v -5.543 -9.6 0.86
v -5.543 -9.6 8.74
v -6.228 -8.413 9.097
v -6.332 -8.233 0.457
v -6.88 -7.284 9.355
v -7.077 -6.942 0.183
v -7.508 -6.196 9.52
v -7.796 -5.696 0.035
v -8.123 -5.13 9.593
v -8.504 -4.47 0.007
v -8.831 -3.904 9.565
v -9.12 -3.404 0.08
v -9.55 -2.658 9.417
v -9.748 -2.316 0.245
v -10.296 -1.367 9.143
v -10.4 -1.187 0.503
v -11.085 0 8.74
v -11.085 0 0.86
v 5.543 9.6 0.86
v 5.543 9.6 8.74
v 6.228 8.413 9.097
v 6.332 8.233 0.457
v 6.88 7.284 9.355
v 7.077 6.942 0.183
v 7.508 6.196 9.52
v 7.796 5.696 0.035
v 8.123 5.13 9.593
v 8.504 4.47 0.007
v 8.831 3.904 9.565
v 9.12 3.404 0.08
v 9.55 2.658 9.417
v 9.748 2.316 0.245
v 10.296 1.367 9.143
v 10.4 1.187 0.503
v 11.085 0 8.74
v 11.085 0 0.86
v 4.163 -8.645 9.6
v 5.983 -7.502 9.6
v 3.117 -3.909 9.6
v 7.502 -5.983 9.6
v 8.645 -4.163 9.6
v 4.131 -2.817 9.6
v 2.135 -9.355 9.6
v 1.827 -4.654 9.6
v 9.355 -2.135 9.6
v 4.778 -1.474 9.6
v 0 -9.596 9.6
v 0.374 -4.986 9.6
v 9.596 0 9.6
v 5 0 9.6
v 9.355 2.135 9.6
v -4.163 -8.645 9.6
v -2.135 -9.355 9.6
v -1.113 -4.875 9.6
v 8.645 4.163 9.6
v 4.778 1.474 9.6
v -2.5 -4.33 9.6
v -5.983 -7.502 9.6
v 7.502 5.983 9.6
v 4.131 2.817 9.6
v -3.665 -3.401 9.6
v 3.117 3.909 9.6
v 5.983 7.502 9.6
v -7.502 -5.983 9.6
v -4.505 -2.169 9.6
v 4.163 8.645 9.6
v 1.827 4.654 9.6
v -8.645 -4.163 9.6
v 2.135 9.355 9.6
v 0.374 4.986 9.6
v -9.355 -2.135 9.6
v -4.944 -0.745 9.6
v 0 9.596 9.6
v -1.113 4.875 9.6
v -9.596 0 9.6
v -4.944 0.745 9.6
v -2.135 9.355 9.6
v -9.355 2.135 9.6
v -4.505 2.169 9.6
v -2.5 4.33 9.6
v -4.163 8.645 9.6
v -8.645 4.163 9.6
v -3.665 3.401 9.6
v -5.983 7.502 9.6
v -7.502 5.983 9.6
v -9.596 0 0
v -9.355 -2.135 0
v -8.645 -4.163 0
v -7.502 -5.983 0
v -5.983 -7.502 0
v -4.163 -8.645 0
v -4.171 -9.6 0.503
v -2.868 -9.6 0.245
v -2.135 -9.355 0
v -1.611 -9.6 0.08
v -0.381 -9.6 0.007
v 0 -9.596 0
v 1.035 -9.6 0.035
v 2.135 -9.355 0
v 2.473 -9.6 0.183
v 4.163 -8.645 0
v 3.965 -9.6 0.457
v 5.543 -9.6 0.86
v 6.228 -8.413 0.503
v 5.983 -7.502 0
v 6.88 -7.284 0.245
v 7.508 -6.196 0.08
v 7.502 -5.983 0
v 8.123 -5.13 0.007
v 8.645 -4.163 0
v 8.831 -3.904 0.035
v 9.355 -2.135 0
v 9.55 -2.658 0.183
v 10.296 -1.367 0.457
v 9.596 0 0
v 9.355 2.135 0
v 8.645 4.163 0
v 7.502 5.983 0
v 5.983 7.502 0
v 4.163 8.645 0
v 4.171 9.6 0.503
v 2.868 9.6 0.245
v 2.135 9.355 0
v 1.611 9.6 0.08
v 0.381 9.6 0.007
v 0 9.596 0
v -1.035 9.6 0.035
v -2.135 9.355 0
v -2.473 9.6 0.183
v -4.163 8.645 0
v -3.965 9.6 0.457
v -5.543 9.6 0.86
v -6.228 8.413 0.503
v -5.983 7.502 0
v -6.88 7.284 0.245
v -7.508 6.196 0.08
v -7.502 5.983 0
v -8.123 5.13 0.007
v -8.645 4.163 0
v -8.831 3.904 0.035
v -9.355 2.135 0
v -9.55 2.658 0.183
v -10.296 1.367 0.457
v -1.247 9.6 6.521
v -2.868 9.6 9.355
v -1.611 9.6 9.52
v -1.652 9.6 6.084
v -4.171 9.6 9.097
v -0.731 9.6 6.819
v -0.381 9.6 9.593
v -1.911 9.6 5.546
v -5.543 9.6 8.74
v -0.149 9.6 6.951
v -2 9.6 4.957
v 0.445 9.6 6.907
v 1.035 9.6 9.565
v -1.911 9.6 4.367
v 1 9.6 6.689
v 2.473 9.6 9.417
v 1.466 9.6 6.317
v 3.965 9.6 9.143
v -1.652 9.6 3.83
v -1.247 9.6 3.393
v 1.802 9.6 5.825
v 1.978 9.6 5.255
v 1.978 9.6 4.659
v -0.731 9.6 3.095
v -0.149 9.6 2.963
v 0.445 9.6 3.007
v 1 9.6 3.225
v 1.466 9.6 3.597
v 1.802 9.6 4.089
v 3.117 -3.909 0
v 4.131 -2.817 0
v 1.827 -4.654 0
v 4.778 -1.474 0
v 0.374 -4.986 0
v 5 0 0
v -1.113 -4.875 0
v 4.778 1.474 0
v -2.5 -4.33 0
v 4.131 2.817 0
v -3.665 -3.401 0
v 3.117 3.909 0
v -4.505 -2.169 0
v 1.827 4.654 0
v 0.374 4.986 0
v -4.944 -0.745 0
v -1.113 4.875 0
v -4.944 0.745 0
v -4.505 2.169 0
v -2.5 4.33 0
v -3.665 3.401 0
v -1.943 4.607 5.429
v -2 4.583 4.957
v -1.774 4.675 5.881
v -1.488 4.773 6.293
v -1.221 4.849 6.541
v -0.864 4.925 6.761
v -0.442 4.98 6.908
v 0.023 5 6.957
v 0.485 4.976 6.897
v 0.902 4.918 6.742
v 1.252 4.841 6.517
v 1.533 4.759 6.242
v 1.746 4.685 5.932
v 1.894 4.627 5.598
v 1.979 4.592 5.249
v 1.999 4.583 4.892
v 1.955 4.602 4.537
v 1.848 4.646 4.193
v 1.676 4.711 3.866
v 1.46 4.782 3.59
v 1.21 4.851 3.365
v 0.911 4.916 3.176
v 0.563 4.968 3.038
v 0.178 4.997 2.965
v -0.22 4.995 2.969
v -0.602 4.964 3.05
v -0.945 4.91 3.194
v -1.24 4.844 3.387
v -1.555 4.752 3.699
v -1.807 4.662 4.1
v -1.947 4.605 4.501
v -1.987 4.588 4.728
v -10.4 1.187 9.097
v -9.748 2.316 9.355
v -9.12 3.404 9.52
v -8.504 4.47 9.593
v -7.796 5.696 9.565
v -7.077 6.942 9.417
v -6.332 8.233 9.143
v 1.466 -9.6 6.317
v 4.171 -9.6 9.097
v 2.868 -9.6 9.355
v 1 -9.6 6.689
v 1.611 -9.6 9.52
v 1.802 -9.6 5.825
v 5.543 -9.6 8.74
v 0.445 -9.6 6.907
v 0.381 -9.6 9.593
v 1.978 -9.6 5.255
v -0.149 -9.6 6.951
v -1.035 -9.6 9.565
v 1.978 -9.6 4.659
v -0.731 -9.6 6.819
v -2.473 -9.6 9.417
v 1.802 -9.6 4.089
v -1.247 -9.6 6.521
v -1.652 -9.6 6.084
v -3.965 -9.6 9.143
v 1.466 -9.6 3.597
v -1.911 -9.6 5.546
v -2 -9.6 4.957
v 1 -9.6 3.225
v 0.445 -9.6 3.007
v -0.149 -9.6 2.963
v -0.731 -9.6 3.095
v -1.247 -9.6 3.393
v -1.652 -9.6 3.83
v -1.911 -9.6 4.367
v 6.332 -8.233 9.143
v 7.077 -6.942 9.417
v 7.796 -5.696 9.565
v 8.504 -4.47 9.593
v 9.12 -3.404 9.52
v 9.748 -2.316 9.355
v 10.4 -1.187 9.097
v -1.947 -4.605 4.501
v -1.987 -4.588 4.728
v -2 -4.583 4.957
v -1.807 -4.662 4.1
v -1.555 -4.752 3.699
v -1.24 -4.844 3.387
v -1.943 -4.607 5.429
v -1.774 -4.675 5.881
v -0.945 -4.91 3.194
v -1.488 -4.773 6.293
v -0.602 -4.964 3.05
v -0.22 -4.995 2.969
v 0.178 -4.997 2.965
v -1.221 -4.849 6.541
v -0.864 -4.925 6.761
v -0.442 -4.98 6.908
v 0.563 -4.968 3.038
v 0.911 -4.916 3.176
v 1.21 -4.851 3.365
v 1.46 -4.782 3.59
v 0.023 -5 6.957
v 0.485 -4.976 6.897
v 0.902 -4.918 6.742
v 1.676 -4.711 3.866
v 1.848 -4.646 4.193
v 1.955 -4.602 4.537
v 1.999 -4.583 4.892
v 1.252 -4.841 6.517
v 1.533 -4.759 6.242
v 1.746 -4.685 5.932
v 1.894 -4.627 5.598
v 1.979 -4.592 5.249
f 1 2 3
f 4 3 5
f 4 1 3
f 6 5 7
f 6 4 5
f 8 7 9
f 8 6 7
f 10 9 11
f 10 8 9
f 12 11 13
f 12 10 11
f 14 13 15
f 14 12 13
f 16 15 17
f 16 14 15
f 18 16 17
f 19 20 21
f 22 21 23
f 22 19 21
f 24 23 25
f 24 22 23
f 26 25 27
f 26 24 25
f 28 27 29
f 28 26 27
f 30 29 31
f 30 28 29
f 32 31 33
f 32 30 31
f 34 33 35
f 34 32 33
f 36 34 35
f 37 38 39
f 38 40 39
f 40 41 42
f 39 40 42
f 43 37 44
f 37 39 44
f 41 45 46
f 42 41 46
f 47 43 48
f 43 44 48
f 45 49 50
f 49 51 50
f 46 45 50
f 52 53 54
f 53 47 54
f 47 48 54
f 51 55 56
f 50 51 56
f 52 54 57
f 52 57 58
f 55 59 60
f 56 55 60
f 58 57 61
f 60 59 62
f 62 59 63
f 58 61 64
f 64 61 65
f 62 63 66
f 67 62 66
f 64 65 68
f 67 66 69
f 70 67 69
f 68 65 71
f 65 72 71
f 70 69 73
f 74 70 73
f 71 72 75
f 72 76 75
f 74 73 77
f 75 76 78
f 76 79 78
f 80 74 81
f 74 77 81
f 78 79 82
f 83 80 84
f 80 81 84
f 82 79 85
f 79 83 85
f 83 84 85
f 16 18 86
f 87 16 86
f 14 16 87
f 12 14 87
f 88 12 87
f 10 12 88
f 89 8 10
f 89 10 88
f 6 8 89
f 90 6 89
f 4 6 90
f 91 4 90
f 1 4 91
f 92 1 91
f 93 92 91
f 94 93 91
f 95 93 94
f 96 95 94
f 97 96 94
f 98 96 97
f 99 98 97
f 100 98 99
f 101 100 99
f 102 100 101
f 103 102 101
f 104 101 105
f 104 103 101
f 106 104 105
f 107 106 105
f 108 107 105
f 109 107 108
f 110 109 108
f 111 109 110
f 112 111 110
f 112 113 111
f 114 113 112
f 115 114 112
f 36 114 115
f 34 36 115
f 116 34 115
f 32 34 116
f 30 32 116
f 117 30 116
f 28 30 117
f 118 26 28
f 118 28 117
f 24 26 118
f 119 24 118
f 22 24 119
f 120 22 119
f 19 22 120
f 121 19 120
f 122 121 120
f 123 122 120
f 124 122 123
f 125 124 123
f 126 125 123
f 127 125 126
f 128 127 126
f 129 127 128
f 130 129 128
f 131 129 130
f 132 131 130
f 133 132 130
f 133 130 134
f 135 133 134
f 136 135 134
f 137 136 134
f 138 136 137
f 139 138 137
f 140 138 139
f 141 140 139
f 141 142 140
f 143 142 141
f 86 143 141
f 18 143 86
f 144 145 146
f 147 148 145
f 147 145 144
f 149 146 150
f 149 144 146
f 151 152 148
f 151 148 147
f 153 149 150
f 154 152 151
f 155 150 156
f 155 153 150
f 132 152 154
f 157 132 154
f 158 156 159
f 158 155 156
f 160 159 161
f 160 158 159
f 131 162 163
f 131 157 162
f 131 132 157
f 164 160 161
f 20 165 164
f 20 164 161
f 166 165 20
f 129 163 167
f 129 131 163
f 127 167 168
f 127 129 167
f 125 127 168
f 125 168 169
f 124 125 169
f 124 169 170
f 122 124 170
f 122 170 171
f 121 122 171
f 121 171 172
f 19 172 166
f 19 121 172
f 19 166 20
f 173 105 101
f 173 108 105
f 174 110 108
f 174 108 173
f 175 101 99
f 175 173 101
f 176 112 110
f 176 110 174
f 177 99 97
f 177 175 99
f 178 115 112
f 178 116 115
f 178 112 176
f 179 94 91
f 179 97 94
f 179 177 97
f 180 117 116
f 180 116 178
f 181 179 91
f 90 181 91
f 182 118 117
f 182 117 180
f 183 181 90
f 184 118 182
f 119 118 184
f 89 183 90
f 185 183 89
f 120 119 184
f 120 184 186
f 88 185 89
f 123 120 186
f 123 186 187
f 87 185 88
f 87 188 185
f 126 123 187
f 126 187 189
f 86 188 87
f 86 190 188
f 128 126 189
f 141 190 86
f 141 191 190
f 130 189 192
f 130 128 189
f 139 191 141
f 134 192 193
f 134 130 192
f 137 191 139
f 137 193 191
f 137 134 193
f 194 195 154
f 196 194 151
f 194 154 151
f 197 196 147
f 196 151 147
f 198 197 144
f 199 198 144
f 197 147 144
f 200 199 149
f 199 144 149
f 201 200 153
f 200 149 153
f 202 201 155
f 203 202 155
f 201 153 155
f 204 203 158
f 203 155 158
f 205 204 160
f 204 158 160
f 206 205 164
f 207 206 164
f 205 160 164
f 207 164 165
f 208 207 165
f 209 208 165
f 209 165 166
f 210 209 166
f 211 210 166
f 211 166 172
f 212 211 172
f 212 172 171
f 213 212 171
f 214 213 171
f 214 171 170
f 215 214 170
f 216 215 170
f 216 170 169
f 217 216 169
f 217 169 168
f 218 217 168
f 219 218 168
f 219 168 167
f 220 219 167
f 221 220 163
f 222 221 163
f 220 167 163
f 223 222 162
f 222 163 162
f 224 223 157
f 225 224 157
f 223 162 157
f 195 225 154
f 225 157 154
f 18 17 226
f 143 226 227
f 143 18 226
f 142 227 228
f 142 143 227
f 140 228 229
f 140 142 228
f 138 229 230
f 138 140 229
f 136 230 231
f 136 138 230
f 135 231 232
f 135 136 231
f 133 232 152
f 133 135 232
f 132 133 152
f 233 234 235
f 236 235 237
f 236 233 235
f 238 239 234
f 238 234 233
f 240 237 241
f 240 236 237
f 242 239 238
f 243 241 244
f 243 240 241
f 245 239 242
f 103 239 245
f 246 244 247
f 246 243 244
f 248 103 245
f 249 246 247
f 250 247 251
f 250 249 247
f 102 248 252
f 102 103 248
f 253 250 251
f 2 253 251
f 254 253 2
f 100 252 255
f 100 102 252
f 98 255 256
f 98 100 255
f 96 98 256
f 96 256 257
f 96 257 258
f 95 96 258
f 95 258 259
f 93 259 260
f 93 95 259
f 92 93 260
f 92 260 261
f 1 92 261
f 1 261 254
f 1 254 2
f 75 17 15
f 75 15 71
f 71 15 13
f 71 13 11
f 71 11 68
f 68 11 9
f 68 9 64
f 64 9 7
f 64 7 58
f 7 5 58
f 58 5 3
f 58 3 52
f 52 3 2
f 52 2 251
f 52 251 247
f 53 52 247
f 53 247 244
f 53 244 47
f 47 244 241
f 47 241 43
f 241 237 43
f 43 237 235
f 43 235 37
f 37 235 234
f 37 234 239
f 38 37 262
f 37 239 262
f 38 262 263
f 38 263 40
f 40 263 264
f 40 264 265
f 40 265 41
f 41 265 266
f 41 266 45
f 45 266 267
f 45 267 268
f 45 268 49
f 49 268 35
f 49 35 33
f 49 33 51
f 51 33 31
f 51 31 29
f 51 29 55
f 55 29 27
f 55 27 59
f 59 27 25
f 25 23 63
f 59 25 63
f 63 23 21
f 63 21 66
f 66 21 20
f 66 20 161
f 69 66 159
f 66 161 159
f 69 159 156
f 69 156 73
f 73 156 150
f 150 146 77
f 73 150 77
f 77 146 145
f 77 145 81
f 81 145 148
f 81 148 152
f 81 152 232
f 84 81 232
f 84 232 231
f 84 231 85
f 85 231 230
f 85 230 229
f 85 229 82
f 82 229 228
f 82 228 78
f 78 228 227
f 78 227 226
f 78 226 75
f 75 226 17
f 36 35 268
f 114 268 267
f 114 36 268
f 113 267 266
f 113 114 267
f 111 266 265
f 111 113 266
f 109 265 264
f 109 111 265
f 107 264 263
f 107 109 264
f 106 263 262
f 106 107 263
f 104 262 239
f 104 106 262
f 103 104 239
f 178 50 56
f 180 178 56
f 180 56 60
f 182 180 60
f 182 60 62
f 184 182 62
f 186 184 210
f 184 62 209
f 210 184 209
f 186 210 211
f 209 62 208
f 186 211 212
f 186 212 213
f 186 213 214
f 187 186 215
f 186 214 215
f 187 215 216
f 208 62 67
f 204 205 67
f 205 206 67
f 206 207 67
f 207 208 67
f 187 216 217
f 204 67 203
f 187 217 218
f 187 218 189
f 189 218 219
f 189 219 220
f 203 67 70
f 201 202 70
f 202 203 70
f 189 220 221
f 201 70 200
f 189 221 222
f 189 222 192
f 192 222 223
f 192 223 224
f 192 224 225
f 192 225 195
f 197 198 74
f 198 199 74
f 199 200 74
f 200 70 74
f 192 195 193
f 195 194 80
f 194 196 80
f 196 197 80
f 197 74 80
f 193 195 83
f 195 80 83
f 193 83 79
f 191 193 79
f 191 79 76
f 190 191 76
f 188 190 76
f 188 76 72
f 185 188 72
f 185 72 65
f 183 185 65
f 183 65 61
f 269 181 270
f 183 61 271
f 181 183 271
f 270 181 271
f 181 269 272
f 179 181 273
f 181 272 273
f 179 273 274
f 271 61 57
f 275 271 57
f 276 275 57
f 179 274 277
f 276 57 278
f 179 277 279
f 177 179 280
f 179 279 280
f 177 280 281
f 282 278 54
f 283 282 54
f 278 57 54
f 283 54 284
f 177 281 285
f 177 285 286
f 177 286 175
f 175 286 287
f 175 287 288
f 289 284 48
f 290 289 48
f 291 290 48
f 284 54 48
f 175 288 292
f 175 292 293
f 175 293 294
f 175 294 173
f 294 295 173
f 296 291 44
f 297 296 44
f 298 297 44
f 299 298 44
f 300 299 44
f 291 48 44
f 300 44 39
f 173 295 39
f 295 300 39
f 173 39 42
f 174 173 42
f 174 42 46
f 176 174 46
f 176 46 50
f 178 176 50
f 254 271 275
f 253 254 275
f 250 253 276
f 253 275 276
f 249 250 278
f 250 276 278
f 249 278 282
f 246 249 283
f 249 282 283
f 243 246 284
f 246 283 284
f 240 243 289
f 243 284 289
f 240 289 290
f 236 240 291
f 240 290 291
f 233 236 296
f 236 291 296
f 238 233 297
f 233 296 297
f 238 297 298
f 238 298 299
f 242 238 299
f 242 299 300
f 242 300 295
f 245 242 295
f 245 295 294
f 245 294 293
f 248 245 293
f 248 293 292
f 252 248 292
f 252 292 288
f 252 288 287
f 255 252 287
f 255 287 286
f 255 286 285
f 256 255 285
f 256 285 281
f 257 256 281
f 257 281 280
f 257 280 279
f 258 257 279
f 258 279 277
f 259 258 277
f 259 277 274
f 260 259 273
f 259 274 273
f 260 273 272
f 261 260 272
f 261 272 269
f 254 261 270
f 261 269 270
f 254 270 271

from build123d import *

# Parameters (mm, degrees)
BASE_EXTRUSION_DEPTH    = 9.6
ESQUISSE2_R             = 5
ENL_V_MAT_EXTRU_1_DEPTH = 10.6
ESQUISSE4_R             = 2
ENL_V_MAT_EXTRU_2_DEPTH = 20.2


with BuildPart() as part:
    # Esquisse1 → Base-Extrusion (new body)
    with BuildSketch(Plane.XY):
        Polygon((-11.085125168, 0), (-5.542562584, 9.6), (5.542562584, 9.6), (11.085125168, 0), (5.542562584, -9.6), (-5.542562584, -9.6), align=None)
    extrude(amount=BASE_EXTRUSION_DEPTH)

    # Esquisse2 → Enl_v. mat.-Extru.1 (cut, through all)
    with BuildSketch(Plane.XY.offset(9.6)):
        Circle(ESQUISSE2_R)
    extrude(amount=-ENL_V_MAT_EXTRU_1_DEPTH, mode=Mode.SUBTRACT)

    # Esquisse4 → Enl_v. mat.-Extru.2 (cut, through all)
    with BuildSketch(Plane(origin=(0, 9.6, 0), x_dir=(-1, 0, 0), z_dir=(0, 1, 0))):
        with Locations((0, 4.956948818)):
            Circle(ESQUISSE4_R)
    extrude(amount=-ENL_V_MAT_EXTRU_2_DEPTH, mode=Mode.SUBTRACT)

    # Esquisse6 → Enl_vement de mati_re-R_volution2 (revolve, cut)
    with BuildSketch(Plane(origin=(0, 0, 0), x_dir=(1, 0, 0), z_dir=(0, 1, 0))):
        Polygon((-11.085125168, 0), (-9.595561474, 0), (-11.085125168, -0.86), align=None)
        Polygon((-11.085125168, -8.74), (-11.085125168, -9.6), (-9.595561474, -9.6), align=None)
    revolve(axis=Axis((0, 0, 0), (0, 0, 1)), mode=Mode.SUBTRACT)


solid = part.part
